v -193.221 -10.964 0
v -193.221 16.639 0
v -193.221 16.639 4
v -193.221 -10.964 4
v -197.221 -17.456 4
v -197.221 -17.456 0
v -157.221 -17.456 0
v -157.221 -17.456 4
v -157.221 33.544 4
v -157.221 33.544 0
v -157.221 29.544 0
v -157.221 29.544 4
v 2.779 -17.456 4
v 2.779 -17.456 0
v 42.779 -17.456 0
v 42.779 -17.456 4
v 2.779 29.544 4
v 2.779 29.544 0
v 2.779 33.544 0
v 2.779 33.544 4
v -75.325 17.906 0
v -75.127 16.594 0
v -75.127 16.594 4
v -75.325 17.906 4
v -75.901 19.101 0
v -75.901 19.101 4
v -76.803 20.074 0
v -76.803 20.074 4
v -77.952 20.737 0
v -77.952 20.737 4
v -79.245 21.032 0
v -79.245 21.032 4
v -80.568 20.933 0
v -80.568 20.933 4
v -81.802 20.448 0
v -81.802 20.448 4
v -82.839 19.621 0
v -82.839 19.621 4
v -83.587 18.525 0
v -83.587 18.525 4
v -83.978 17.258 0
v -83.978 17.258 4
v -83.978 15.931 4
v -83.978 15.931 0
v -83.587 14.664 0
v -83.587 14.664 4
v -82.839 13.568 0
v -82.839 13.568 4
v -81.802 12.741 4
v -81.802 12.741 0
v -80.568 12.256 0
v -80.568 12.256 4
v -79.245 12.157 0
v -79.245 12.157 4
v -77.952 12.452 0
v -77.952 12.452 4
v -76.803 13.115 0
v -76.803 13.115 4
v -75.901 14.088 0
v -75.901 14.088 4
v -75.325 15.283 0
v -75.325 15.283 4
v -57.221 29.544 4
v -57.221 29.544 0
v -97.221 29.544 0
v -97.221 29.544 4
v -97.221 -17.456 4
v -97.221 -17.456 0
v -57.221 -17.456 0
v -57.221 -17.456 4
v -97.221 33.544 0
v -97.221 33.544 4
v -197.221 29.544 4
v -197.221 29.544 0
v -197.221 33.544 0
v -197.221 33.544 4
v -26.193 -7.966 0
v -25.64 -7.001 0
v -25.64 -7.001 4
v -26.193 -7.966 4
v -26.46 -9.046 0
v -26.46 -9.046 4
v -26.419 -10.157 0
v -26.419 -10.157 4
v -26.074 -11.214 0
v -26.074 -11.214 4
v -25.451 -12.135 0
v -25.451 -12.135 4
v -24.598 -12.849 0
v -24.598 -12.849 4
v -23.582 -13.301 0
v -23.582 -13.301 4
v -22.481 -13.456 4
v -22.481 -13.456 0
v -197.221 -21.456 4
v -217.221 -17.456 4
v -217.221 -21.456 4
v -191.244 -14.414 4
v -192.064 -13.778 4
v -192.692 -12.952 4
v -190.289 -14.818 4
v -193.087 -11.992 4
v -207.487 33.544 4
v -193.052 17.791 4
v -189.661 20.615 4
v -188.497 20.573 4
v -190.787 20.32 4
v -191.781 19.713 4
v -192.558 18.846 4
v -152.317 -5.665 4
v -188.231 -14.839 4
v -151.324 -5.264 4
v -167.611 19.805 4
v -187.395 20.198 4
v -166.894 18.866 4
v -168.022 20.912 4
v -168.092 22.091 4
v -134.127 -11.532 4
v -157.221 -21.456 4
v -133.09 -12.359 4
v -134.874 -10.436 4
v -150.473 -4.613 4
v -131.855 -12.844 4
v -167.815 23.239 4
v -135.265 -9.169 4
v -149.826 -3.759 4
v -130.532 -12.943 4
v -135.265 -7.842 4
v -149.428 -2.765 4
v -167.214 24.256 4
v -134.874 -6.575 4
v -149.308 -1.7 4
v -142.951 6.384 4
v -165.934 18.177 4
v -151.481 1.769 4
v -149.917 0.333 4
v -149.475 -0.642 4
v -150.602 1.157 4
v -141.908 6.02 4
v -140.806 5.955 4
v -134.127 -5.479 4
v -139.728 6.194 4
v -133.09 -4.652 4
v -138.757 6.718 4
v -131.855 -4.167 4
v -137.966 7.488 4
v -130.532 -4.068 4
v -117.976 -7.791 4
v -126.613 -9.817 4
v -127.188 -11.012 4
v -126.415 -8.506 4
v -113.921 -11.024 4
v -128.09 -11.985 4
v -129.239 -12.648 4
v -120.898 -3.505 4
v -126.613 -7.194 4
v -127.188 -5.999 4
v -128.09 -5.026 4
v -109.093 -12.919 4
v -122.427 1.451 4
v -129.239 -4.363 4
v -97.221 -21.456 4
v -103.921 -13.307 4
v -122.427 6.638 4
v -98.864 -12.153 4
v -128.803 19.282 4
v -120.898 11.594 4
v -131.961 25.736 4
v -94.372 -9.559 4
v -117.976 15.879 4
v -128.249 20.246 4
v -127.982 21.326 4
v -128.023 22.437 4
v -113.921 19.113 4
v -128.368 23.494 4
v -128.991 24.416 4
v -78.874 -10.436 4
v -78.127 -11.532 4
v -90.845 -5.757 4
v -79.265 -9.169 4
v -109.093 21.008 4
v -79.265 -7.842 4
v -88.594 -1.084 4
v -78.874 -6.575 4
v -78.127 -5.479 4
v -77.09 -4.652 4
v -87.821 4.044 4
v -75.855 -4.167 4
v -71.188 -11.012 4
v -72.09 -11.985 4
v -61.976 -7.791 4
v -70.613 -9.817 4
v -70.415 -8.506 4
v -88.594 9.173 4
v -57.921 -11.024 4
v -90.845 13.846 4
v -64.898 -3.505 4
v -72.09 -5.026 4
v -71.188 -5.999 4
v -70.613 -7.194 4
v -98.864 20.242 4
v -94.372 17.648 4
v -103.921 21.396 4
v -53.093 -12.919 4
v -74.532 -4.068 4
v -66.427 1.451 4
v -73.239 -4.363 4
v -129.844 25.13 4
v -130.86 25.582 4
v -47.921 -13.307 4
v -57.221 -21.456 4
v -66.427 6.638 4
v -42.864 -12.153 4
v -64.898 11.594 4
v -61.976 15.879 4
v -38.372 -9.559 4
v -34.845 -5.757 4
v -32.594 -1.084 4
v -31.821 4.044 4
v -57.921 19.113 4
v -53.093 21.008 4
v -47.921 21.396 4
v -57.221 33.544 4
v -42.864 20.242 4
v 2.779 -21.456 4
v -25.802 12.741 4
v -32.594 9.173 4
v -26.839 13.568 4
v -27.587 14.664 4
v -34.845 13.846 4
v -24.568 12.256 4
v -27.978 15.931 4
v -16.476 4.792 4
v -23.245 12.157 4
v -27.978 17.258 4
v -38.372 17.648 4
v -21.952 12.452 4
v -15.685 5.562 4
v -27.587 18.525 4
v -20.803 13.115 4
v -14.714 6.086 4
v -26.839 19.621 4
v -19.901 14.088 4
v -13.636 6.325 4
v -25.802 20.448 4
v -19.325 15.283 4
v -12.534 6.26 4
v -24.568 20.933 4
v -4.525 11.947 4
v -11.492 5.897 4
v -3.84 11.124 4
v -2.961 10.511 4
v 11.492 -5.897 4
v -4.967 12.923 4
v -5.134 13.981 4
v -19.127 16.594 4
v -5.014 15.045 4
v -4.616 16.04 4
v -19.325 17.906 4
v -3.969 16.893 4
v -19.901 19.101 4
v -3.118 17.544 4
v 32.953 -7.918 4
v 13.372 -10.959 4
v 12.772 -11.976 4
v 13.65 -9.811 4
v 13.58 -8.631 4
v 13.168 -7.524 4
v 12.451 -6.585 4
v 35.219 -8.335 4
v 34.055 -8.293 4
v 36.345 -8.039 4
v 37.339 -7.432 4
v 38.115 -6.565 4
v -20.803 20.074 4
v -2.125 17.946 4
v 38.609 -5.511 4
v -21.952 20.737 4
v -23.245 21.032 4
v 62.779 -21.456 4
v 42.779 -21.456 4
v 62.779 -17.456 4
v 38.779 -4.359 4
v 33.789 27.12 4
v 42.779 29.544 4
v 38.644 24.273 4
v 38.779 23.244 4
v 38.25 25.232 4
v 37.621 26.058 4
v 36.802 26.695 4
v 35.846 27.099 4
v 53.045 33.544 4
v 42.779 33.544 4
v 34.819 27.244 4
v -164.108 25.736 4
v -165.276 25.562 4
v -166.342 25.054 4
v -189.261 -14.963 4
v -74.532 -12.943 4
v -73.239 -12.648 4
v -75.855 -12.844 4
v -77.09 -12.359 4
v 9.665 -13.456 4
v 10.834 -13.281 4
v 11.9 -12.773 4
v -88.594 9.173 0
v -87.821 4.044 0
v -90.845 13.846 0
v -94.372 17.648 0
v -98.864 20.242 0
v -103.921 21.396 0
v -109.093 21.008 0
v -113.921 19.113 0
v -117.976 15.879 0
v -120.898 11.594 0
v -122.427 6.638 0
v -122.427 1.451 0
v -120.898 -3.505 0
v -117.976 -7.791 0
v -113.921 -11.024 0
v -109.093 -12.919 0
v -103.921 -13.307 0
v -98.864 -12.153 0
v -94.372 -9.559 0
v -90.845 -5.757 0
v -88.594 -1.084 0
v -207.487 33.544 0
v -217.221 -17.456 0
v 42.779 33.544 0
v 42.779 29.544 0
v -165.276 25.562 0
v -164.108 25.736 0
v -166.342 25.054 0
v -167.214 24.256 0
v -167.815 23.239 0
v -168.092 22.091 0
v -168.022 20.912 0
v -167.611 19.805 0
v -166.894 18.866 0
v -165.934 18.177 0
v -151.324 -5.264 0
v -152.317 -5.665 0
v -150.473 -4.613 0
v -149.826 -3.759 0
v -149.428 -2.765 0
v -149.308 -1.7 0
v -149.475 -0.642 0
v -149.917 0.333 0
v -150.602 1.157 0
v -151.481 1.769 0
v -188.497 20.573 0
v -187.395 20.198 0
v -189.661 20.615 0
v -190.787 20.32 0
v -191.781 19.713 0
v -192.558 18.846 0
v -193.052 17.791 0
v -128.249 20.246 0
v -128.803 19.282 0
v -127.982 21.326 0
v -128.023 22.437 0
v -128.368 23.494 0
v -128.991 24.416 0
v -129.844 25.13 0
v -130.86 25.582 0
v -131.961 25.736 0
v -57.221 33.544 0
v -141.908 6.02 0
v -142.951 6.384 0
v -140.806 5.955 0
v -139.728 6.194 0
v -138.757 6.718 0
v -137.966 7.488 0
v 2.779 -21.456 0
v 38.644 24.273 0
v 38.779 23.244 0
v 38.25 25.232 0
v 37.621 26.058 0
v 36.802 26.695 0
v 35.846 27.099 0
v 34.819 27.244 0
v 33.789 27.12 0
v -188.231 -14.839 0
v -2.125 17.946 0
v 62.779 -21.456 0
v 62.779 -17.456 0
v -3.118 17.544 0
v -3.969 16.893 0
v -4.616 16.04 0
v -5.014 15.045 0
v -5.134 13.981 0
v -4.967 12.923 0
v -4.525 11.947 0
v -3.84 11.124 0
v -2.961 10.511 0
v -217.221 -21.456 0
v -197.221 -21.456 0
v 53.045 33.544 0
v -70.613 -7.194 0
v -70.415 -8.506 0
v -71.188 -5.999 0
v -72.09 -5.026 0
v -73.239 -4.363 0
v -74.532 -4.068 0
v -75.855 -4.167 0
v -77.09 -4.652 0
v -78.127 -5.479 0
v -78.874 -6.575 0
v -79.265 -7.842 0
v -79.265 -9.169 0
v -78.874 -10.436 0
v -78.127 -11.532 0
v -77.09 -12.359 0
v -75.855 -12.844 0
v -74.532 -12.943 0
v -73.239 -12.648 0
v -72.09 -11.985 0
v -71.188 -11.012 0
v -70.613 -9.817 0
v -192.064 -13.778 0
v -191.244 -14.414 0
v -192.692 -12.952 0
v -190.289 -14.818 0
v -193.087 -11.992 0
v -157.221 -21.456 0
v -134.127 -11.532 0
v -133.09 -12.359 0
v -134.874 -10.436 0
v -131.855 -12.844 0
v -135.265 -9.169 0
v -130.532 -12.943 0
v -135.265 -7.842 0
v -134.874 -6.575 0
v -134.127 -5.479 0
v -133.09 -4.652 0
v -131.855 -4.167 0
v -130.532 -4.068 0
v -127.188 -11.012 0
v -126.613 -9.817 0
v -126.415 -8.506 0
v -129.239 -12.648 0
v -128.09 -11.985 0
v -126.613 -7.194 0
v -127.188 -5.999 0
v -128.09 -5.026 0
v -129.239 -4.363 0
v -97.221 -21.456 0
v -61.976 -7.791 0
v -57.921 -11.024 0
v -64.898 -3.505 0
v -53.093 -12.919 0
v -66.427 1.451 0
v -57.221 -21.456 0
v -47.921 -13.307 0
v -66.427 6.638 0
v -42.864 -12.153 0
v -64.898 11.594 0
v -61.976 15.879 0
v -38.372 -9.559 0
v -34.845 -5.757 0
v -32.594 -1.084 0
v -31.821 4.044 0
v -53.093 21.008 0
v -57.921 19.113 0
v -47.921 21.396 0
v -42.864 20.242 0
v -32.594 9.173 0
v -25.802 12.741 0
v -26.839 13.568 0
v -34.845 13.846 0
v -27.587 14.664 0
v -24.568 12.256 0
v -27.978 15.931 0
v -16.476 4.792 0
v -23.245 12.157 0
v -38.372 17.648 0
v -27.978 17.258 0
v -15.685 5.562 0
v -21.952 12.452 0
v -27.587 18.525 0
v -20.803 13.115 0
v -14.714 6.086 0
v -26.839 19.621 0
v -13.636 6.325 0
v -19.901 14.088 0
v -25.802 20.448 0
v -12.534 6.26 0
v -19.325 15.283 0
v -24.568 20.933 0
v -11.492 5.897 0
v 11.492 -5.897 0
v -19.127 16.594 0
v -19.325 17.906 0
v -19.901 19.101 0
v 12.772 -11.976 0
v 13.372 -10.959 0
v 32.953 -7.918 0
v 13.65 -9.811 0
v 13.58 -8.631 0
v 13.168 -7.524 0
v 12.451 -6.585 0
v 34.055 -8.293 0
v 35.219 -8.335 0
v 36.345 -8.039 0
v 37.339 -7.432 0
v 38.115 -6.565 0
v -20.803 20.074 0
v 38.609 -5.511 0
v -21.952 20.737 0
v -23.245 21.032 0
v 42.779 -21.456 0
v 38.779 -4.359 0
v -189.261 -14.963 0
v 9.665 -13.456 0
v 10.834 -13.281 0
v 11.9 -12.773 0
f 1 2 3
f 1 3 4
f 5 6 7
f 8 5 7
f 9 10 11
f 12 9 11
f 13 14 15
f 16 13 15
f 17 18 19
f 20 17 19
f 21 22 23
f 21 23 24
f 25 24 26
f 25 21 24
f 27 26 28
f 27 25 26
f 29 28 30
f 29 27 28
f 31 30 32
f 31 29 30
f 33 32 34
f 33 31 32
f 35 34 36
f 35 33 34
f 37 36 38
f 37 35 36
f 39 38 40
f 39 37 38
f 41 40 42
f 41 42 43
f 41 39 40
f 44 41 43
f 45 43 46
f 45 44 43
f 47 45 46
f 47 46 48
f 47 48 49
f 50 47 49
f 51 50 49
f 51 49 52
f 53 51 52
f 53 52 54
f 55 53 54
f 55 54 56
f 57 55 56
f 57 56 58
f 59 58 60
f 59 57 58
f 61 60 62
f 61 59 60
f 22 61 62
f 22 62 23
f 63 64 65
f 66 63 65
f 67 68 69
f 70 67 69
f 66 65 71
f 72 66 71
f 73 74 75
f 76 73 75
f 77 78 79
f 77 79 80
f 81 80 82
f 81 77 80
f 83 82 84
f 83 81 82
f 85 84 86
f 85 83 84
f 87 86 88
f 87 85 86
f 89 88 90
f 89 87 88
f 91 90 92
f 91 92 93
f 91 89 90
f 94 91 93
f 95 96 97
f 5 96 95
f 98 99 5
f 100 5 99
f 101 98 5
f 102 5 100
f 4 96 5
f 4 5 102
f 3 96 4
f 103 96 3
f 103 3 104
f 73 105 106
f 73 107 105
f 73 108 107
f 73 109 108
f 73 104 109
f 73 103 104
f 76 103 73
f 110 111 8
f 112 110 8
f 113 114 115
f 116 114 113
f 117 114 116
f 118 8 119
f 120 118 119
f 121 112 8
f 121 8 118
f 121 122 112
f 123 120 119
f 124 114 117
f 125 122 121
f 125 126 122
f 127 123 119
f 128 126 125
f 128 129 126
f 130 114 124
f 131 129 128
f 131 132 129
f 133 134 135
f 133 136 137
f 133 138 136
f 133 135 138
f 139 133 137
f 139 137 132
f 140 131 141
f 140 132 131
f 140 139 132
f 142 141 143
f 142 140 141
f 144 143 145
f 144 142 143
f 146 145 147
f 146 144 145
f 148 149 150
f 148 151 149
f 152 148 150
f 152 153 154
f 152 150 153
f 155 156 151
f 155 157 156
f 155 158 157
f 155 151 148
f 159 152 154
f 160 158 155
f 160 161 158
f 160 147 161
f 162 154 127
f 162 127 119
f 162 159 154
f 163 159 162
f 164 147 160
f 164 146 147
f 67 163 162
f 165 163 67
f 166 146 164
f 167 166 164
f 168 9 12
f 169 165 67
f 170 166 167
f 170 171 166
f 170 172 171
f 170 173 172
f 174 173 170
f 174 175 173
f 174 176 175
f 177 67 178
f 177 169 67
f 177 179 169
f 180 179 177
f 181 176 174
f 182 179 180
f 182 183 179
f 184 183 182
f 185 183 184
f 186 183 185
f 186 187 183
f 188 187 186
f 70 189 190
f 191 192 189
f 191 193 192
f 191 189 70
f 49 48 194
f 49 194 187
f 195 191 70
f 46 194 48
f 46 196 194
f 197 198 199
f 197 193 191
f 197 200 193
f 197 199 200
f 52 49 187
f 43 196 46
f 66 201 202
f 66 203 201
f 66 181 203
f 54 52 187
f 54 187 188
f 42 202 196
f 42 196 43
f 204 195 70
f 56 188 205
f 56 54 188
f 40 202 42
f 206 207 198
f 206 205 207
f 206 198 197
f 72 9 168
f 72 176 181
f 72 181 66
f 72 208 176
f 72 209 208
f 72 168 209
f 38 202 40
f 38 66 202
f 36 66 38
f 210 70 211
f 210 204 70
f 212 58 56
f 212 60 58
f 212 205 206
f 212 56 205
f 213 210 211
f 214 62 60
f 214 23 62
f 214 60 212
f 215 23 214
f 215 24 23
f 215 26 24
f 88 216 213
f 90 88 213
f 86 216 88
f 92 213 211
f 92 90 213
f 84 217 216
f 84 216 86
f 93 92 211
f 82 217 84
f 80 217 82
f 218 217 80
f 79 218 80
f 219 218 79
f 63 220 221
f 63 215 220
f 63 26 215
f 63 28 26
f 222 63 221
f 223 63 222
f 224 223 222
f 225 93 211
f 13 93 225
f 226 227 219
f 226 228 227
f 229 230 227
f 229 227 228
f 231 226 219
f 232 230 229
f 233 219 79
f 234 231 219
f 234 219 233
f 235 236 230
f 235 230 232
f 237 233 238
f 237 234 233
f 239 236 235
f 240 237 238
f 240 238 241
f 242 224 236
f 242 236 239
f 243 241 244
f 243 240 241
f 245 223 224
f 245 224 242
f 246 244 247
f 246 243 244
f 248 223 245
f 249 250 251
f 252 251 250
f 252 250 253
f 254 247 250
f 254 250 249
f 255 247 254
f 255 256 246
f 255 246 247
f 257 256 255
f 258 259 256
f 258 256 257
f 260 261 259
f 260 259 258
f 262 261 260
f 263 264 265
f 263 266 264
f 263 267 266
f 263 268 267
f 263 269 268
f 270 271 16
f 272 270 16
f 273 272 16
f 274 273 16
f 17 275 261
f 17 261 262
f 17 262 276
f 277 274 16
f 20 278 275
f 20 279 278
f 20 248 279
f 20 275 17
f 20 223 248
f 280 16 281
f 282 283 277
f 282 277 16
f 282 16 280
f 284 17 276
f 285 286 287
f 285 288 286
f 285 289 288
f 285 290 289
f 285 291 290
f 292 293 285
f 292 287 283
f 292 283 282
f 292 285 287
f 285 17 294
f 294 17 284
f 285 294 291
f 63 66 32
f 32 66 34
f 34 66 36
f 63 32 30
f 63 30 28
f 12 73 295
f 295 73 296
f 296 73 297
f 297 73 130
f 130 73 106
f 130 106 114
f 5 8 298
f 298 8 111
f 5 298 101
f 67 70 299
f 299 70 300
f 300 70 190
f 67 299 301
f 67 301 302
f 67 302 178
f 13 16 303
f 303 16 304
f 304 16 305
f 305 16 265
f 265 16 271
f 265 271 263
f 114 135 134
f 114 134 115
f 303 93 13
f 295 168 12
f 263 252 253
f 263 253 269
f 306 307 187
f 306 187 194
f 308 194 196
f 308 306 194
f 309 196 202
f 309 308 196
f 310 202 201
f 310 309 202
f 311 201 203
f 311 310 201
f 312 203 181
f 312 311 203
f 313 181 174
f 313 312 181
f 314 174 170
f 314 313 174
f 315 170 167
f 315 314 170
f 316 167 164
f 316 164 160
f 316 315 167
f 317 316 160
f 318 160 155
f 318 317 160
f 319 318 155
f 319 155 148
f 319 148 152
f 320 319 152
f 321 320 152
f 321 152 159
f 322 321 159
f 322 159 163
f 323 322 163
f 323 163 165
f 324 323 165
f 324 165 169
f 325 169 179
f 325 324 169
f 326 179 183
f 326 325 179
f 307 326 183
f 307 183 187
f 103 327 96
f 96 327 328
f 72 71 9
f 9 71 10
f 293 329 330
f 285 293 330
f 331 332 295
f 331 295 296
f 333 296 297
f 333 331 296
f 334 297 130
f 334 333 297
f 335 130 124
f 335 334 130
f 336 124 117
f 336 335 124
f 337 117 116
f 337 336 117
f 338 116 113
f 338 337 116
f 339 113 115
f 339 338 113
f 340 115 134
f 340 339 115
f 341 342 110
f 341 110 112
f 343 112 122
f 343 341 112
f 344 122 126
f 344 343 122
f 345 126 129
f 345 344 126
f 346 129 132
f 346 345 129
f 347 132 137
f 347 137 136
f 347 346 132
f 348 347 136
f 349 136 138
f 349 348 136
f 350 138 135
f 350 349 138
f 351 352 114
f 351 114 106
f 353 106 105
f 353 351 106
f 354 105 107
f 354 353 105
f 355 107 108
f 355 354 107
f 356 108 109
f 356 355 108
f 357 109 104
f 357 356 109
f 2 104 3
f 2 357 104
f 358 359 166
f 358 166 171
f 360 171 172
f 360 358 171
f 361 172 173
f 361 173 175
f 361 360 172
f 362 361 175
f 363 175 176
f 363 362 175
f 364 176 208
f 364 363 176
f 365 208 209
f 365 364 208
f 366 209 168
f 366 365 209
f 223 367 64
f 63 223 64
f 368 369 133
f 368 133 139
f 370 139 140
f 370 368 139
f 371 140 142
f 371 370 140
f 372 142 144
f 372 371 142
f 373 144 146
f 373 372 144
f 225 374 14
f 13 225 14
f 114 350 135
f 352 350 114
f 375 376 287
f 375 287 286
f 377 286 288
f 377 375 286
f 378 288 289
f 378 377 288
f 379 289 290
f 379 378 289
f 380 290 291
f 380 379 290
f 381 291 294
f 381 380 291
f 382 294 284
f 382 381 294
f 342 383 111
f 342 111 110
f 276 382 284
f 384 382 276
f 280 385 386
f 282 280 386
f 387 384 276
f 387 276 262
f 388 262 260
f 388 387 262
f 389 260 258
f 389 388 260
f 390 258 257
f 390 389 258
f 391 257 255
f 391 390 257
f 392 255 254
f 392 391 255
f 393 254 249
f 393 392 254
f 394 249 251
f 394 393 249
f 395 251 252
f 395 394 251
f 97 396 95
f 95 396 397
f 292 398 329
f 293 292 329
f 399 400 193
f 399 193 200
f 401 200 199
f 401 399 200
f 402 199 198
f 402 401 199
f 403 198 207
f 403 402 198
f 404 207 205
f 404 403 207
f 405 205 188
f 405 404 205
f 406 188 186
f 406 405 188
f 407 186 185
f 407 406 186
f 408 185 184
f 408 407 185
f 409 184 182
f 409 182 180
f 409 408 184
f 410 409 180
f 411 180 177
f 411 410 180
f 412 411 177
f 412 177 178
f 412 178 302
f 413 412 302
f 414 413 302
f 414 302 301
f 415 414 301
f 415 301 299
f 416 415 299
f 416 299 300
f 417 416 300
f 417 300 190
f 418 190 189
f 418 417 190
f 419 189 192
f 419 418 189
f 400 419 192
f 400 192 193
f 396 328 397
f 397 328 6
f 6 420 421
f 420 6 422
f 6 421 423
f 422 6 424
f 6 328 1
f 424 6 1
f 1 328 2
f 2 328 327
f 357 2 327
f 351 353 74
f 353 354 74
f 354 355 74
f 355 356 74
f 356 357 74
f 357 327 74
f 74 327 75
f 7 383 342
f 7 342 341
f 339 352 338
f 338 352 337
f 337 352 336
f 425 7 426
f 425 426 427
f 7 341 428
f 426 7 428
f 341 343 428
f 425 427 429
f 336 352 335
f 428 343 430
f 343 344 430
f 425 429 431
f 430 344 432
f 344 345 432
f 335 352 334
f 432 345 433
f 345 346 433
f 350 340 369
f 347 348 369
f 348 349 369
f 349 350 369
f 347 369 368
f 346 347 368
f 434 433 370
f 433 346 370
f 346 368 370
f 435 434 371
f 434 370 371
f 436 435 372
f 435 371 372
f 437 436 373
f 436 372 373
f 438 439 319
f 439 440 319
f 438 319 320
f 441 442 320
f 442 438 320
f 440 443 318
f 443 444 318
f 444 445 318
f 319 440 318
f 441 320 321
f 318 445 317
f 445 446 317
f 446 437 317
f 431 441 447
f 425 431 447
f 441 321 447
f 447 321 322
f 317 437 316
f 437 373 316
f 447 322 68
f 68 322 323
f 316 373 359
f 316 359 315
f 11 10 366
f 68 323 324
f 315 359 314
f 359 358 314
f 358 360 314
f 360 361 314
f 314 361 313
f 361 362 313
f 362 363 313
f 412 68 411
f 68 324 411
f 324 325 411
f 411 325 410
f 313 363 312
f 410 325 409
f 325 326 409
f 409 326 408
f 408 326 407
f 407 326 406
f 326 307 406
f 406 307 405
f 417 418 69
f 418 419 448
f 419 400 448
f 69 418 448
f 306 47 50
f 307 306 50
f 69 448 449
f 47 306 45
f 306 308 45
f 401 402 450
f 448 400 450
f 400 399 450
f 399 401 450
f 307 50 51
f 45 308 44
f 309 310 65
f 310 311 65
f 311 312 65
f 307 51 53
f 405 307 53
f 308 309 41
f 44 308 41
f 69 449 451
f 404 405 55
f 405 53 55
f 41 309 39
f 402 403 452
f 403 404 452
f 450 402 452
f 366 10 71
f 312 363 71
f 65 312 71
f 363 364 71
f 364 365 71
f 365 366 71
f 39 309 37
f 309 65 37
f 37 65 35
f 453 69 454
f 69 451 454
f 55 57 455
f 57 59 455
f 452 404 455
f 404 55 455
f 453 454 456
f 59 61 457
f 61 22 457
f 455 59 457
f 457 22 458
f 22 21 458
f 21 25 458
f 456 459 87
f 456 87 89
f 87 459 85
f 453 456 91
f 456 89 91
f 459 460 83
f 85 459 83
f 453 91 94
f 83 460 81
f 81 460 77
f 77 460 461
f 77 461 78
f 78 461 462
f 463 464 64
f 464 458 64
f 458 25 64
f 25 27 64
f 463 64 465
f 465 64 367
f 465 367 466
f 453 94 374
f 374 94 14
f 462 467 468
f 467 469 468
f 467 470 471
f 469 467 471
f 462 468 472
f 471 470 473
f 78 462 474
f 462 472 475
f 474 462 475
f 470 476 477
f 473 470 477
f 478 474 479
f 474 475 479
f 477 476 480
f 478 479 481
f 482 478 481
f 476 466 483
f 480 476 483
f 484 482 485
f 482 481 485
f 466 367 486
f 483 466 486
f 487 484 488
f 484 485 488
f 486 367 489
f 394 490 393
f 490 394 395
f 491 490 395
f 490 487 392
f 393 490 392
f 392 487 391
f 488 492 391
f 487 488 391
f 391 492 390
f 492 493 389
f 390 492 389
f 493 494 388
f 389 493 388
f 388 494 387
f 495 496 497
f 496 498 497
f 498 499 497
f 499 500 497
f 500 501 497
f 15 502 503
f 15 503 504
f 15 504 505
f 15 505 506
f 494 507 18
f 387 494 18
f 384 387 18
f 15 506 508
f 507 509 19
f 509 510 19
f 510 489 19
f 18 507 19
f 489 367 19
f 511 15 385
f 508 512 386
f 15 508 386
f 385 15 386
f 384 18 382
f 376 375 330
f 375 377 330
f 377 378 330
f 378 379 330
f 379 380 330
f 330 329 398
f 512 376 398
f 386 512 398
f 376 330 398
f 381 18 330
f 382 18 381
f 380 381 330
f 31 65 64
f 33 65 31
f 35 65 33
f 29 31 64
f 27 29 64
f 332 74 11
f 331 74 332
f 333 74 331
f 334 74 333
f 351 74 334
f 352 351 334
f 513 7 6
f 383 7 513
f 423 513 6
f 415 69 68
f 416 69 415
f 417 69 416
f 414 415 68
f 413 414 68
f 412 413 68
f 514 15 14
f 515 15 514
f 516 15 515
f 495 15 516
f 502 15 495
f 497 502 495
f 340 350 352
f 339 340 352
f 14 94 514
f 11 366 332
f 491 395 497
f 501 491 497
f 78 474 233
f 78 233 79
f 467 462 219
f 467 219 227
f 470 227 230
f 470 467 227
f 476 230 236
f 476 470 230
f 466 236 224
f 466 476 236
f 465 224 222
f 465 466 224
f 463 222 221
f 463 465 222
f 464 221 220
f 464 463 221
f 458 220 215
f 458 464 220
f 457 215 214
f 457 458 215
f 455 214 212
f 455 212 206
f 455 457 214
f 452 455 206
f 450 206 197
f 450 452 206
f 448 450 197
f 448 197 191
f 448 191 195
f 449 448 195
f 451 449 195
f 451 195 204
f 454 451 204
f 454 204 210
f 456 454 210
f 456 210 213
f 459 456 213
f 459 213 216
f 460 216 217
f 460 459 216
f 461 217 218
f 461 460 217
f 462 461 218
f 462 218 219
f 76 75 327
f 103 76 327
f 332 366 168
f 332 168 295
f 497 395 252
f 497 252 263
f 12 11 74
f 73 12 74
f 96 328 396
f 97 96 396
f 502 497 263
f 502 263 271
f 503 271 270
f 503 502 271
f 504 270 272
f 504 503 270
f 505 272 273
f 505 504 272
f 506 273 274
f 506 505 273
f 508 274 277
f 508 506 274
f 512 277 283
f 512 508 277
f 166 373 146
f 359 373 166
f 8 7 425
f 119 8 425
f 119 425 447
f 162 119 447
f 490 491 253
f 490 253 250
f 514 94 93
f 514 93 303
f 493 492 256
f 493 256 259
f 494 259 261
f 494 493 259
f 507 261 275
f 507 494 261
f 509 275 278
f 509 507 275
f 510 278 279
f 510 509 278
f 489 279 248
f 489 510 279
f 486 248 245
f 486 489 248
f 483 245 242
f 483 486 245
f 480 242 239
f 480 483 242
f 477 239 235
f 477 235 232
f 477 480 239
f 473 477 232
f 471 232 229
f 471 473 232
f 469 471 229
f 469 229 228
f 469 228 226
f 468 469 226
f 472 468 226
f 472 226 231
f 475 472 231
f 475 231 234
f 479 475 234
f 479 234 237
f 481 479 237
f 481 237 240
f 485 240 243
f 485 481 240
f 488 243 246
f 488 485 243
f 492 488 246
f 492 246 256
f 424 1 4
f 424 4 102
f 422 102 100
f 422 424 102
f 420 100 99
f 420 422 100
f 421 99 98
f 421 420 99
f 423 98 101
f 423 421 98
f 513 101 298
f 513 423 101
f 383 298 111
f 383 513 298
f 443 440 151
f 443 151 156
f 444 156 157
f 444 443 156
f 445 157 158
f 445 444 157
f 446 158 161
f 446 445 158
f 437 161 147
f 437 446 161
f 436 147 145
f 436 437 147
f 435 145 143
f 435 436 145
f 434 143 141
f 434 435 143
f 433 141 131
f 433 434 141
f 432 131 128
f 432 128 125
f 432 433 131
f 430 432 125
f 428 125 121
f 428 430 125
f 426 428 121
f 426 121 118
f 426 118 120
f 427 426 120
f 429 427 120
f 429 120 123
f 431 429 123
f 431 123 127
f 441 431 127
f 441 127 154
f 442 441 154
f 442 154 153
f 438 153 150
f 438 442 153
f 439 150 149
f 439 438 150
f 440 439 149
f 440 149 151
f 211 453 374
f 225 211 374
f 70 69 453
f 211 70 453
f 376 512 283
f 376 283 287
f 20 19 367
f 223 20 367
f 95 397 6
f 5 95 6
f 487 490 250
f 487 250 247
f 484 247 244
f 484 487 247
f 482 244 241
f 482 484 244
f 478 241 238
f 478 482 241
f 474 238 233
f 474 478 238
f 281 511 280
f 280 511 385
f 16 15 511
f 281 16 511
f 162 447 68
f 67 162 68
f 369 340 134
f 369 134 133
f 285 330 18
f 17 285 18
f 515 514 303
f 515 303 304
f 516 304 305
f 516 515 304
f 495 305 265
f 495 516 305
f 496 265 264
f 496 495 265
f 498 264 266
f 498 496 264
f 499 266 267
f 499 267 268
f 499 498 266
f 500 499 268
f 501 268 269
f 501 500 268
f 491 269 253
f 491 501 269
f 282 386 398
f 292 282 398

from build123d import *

# Parameters (mm, degrees)
SKETCH2_R           = 17.4
SKETCH2_R_2         = 4.45
BOSS_EXTRUDE1_DEPTH = 4


with BuildPart() as part:
    # Sketch2 → Boss-Extrude1 (new body)
    with BuildSketch(Plane.XY):
        Polygon((53.044712849, 33.544372616), (42.778880935, 33.544372616), (42.778880935, 29.544372616), (2.778880935, 29.544372616), (2.778880935, 33.544372616), (-57.221119065, 33.544372616), (-57.221119065, 29.544372616), (-97.221119065, 29.544372616), (-97.221119065, 33.544372616), (-157.221119065, 33.544372616), (-157.221119065, 29.544372616), (-197.221119065, 29.544372616), (-197.221119065, 33.544372616), (-207.486950979, 33.544372616), (-217.221119065, -17.455627384), (-217.221119065, -21.455627384), (-197.221119065, -21.455627384), (-197.221119065, -17.455627384), (-157.221119065, -17.455627384), (-157.221119065, -21.455627384), (-97.221119065, -21.455627384), (-97.221119065, -17.455627384), (-57.221119065, -17.455627384), (-57.221119065, -21.455627384), (2.778880935, -21.455627384), (2.778880935, -17.455627384), (42.778880935, -17.455627384), (42.778880935, -21.455627384), (62.778880935, -21.455627384), (62.778880935, -17.455627384), align=None)
        with Locations((-105.221119065, 4.044372616)):
            Circle(SKETCH2_R, mode=Mode.SUBTRACT)
        with Locations((-130.864831745, -8.505627384)):
            Circle(SKETCH2_R_2, mode=Mode.SUBTRACT)
        with Locations((-79.577406385, 16.594372616)):
            Circle(SKETCH2_R_2, mode=Mode.SUBTRACT)
        with Locations((-74.864831745, -8.505627384)):
            Circle(SKETCH2_R_2, mode=Mode.SUBTRACT)
        with Locations((-49.221119065, 4.044372616)):
            Circle(SKETCH2_R, mode=Mode.SUBTRACT)
        with Locations((-23.577406385, 16.594372616)):
            Circle(SKETCH2_R_2, mode=Mode.SUBTRACT)
        with BuildLine():
            Line((-16.476478057, 4.792165998), (-25.639690827, -7.001469778))
            ThreePointArc((-25.639690827, -7.001469778), (-26.073848783, -11.213946123), (-22.481034397, -13.455627384))
            Line((-22.481034397, -13.455627384), (9.665493618, -13.455627384))
            ThreePointArc((9.665493618, -13.455627384), (13.553631861, -10.39497876), (11.491657622, -5.896817888))
            Line((11.491657622, -5.896817888), (-11.491657622, 5.896817888))
            ThreePointArc((-11.491657622, 5.896817888), (-14.183239425, 6.243267926), (-16.476478057, 4.792165998))
        make_face(mode=Mode.SUBTRACT)
        with BuildLine():
            Line((-165.933895752, 18.177294134), (-142.950580507, 6.383658359))
            ThreePointArc((-142.950580507, 6.383658359), (-140.258998705, 6.03720832), (-137.965760073, 7.488310249))
            Line((-137.965760073, 7.488310249), (-128.802547302, 19.281946025))
            ThreePointArc((-128.802547302, 19.281946025), (-128.368389347, 23.49442237), (-131.961203733, 25.736103631))
            Line((-131.961203733, 25.736103631), (-164.107731748, 25.736103631))
            ThreePointArc((-164.107731748, 25.736103631), (-167.995869991, 22.675455007), (-165.933895752, 18.177294134))
        make_face(mode=Mode.SUBTRACT)
        with BuildLine():
            Line((38.778880935, -4.35874426), (38.778880935, 23.243985793))
            ThreePointArc((38.778880935, 23.243985793), (37.232462018, 26.403090076), (33.788911001, 27.119545047))
            Line((33.788911001, 27.119545047), (-2.125102454, 17.94569653))
            ThreePointArc((-2.125102454, 17.94569653), (-5.110068026, 14.517225335), (-2.961296525, 10.511327779))
            Line((-2.961296525, 10.511327779), (32.952716931, -7.917553756))
            ThreePointArc((32.952716931, -7.917553756), (36.863988125, -7.772294905), (38.778880935, -4.35874426))
        make_face(mode=Mode.SUBTRACT)
        with BuildLine():
            Line((-188.231149131, -14.839068801), (-152.317135675, -5.665220283))
            ThreePointArc((-152.317135675, -5.665220283), (-149.332170104, -2.236749089), (-151.480941605, 1.769148467))
            Line((-151.480941605, 1.769148467), (-187.394955061, 20.198030003))
            ThreePointArc((-187.394955061, 20.198030003), (-191.306226254, 20.052771152), (-193.221119065, 16.639220507))
            Line((-193.221119065, 16.639220507), (-193.221119065, -10.963509547))
            ThreePointArc((-193.221119065, -10.963509547), (-191.674700148, -14.122613829), (-188.231149131, -14.839068801))
        make_face(mode=Mode.SUBTRACT)
    extrude(amount=BOSS_EXTRUDE1_DEPTH)


solid = part.part
